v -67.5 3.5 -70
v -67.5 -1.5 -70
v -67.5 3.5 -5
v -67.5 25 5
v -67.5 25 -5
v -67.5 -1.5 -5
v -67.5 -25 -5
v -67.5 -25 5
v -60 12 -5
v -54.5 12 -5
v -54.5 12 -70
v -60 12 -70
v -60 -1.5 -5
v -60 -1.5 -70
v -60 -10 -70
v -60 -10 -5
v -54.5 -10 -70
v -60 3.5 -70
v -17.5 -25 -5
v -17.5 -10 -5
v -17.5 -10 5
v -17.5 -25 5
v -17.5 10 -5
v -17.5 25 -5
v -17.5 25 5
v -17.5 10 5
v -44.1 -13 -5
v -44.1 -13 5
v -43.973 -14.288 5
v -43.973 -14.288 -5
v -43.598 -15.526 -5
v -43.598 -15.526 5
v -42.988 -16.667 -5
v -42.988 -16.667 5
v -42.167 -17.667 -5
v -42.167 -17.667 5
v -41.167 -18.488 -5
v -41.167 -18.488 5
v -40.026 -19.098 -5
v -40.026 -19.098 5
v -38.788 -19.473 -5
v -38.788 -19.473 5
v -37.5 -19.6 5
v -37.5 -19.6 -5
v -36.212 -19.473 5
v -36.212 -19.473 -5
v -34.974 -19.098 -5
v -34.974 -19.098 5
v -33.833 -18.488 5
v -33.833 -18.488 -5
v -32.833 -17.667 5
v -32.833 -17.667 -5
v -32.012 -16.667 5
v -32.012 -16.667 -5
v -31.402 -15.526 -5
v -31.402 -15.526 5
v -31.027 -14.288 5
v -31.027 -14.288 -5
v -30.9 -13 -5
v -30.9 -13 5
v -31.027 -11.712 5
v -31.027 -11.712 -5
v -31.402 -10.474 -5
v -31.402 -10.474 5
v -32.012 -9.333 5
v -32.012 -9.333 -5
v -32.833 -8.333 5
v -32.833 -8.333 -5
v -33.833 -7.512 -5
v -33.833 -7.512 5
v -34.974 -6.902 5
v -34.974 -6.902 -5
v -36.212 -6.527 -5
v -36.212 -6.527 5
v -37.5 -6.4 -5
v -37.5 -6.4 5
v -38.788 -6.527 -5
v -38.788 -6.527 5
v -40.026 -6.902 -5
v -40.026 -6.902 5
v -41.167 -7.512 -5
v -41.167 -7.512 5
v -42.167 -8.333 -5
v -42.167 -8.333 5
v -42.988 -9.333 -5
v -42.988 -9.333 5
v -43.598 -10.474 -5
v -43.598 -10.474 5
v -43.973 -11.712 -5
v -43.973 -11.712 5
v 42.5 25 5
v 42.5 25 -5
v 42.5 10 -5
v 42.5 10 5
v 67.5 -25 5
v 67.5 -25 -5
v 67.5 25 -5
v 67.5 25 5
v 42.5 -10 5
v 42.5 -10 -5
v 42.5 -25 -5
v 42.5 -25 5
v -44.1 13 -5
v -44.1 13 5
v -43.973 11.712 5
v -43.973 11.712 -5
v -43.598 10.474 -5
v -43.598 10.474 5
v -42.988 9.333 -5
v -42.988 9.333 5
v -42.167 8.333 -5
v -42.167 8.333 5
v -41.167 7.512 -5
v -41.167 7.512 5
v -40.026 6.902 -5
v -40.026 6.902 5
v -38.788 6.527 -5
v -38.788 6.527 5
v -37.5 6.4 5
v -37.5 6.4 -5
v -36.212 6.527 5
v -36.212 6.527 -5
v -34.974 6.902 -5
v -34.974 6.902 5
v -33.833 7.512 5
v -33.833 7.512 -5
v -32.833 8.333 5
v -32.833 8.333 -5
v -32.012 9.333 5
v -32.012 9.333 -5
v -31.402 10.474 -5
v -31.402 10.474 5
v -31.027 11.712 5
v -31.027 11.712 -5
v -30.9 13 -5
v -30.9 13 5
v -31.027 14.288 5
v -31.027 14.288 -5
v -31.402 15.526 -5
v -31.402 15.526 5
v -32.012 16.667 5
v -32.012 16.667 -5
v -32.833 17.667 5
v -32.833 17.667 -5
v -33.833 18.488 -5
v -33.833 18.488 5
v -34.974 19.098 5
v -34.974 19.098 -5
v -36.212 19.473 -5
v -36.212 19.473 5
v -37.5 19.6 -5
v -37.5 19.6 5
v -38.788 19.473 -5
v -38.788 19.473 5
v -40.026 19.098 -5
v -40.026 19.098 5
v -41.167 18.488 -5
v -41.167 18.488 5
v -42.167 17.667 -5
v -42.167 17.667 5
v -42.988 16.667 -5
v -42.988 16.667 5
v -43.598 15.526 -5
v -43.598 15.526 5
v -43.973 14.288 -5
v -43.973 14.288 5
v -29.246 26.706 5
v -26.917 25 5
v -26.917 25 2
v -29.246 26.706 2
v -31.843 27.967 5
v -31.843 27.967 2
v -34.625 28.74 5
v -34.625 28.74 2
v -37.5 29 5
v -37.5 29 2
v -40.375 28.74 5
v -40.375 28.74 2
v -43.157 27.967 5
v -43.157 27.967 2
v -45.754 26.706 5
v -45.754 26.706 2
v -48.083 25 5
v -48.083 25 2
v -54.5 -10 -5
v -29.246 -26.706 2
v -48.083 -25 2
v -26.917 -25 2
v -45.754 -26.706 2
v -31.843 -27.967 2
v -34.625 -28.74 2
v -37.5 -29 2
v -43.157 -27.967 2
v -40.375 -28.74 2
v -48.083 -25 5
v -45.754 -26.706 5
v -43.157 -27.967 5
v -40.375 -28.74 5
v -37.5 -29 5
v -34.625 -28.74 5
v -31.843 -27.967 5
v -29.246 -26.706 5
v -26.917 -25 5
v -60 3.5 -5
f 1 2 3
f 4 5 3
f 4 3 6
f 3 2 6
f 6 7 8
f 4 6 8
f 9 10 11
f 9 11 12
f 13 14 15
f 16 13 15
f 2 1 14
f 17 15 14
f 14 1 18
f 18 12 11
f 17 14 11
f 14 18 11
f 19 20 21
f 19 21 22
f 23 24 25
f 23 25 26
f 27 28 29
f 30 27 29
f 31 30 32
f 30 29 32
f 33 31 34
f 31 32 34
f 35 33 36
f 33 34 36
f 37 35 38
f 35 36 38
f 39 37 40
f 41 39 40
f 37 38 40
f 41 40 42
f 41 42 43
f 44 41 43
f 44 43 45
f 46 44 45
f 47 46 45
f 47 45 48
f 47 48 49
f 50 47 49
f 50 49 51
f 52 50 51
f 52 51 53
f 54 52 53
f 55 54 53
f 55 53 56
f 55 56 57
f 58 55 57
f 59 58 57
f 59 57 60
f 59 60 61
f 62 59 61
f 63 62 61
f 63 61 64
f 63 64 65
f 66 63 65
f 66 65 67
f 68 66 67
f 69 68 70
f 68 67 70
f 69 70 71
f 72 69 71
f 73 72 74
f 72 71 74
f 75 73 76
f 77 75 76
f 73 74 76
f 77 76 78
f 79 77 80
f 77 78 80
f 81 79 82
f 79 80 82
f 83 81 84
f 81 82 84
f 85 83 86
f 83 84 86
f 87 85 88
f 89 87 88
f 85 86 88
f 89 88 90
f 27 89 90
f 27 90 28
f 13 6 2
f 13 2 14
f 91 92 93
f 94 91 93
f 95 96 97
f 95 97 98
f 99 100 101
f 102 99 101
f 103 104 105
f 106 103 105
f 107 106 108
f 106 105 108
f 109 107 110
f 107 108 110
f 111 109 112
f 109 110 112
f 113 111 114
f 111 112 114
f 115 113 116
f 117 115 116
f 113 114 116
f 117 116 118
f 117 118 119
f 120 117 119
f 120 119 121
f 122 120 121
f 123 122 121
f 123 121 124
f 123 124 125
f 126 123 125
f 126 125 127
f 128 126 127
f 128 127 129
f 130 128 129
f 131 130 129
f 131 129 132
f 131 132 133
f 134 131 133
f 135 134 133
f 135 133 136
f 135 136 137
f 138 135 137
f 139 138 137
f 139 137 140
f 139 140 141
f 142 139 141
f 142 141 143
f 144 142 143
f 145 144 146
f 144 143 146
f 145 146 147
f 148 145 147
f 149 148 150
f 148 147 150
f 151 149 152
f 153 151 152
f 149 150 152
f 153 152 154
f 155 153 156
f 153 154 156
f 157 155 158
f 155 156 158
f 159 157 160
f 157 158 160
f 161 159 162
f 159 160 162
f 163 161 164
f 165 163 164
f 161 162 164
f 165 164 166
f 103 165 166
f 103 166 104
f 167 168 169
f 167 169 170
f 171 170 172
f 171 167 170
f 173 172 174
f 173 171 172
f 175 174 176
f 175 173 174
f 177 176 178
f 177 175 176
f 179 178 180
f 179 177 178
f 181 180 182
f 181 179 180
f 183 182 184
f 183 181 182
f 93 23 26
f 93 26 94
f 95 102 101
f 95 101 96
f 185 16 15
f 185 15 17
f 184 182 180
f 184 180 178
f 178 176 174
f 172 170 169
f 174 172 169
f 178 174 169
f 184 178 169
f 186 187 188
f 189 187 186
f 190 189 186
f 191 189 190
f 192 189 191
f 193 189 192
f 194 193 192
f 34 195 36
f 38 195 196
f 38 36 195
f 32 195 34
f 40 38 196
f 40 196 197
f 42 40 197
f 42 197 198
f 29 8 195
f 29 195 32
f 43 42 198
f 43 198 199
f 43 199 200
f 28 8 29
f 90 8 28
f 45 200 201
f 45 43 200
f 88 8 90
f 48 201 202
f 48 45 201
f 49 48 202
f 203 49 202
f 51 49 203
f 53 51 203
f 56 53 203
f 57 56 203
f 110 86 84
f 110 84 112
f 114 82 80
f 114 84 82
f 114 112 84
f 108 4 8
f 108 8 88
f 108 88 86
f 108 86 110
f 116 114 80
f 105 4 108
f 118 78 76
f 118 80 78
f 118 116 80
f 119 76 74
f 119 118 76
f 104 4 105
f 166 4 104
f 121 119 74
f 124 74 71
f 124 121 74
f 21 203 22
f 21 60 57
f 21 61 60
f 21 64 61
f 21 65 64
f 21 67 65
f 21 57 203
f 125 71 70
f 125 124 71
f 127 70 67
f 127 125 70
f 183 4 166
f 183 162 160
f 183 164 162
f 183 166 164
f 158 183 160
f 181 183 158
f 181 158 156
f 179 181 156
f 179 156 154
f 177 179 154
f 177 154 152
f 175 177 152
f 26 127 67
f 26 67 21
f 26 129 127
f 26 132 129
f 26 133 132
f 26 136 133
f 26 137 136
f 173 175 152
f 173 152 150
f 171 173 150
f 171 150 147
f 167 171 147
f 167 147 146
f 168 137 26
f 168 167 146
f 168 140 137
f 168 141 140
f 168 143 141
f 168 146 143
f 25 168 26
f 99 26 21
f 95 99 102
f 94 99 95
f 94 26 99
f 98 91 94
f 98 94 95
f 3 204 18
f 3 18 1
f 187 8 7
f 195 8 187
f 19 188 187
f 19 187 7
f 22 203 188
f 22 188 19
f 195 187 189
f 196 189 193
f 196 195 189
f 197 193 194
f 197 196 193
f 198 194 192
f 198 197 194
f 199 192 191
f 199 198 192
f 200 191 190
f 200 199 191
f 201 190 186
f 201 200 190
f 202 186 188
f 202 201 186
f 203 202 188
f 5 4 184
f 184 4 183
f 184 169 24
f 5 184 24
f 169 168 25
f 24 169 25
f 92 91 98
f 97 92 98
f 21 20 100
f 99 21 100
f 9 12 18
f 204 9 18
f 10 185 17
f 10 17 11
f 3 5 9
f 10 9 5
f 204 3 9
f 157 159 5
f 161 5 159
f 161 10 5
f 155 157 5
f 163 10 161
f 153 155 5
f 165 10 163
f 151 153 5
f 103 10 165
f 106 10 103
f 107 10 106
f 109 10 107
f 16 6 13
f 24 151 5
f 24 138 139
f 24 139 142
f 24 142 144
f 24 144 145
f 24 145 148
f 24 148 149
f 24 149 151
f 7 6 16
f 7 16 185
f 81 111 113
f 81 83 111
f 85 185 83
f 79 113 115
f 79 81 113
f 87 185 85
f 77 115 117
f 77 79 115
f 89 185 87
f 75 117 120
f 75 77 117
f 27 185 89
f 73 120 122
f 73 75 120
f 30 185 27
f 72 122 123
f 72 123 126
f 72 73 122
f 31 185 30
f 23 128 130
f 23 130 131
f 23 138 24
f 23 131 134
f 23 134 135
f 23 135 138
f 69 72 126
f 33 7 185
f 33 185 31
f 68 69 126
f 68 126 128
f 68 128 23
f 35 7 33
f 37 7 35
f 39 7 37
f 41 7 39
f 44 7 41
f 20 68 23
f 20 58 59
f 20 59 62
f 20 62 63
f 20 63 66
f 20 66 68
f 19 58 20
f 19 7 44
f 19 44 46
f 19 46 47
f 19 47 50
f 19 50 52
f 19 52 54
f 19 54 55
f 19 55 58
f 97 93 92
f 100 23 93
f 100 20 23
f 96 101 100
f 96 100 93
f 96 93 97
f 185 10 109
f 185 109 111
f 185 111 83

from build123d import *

# Parameters (mm, degrees)
F0_W           = 135
F0_H           = 10
F1_DEPTH       = 25
F4_DEPTH       = 75
F6_DEPTH       = 3
F7_W           = 60
F7_H           = 15
F8_DEPTH       = 25
F9_D           = 13.2
F9_CBORE_D     = 23
F9_CBORE_DEPTH = 0


with BuildPart() as f1:
    # F0 (on Front) → F1 (new body, symmetric)
    with BuildSketch(Plane.XZ):
        Rectangle(F0_W, F0_H)
    extrude(amount=F1_DEPTH, both=True)

    # F3 (on face) → F4 (join)
    with BuildSketch(Plane.XY.offset(5)):
        Polygon((-60, 3.5), (-67.5, 3.5), (-67.5, -1.5), (-60, -1.5), (-60, -10), (-54.5, -10), (-54.5, 12), (-60, 12), align=None)
    extrude(amount=-F4_DEPTH)

    # F5 (on face) → F6 (join)
    with BuildSketch(Plane.XY.offset(5)):
        with BuildLine():
            ThreePointArc((-28.172621, 0), (-23.265569, 5.693772), (-21.5, 13))
            ThreePointArc((-21.5, 13), (-44.806228, 27.234431), (-46.827379, 0))
            ThreePointArc((-46.827379, 0), (-37.5, 3), (-28.172621, 0))
        make_face()
        with BuildLine():
            ThreePointArc((-28.172621, 0), (-37.5, -3), (-46.827379, 0))
            ThreePointArc((-46.827379, 0), (-44.806228, -27.234431), (-21.5, -13))
            ThreePointArc((-21.5, -13), (-23.265569, -5.693772), (-28.172621, 0))
        make_face()
    extrude(amount=-F6_DEPTH)

    # F7 (on face) → F8 (cut)
    with BuildSketch(Plane(origin=(0, 0, -5), x_dir=(1, 0, 0), z_dir=(0, 0, -1))):
        with Locations((12.5, 17.5)):
            Rectangle(F7_W, F7_H)
        with Locations((12.5, -17.5)):
            Rectangle(F7_W, F7_H)
    extrude(amount=-F8_DEPTH, mode=Mode.SUBTRACT)

    # F9 (through all)
    with Locations(Plane(origin=(0, 0, -5), x_dir=(1, 0, 0), z_dir=(0, 0, -1))):
        with Locations((-37.5, 13), (-37.5, -13)):
            CounterBoreHole(F9_D / 2, F9_CBORE_D / 2, F9_CBORE_DEPTH)


solid = f1.part
